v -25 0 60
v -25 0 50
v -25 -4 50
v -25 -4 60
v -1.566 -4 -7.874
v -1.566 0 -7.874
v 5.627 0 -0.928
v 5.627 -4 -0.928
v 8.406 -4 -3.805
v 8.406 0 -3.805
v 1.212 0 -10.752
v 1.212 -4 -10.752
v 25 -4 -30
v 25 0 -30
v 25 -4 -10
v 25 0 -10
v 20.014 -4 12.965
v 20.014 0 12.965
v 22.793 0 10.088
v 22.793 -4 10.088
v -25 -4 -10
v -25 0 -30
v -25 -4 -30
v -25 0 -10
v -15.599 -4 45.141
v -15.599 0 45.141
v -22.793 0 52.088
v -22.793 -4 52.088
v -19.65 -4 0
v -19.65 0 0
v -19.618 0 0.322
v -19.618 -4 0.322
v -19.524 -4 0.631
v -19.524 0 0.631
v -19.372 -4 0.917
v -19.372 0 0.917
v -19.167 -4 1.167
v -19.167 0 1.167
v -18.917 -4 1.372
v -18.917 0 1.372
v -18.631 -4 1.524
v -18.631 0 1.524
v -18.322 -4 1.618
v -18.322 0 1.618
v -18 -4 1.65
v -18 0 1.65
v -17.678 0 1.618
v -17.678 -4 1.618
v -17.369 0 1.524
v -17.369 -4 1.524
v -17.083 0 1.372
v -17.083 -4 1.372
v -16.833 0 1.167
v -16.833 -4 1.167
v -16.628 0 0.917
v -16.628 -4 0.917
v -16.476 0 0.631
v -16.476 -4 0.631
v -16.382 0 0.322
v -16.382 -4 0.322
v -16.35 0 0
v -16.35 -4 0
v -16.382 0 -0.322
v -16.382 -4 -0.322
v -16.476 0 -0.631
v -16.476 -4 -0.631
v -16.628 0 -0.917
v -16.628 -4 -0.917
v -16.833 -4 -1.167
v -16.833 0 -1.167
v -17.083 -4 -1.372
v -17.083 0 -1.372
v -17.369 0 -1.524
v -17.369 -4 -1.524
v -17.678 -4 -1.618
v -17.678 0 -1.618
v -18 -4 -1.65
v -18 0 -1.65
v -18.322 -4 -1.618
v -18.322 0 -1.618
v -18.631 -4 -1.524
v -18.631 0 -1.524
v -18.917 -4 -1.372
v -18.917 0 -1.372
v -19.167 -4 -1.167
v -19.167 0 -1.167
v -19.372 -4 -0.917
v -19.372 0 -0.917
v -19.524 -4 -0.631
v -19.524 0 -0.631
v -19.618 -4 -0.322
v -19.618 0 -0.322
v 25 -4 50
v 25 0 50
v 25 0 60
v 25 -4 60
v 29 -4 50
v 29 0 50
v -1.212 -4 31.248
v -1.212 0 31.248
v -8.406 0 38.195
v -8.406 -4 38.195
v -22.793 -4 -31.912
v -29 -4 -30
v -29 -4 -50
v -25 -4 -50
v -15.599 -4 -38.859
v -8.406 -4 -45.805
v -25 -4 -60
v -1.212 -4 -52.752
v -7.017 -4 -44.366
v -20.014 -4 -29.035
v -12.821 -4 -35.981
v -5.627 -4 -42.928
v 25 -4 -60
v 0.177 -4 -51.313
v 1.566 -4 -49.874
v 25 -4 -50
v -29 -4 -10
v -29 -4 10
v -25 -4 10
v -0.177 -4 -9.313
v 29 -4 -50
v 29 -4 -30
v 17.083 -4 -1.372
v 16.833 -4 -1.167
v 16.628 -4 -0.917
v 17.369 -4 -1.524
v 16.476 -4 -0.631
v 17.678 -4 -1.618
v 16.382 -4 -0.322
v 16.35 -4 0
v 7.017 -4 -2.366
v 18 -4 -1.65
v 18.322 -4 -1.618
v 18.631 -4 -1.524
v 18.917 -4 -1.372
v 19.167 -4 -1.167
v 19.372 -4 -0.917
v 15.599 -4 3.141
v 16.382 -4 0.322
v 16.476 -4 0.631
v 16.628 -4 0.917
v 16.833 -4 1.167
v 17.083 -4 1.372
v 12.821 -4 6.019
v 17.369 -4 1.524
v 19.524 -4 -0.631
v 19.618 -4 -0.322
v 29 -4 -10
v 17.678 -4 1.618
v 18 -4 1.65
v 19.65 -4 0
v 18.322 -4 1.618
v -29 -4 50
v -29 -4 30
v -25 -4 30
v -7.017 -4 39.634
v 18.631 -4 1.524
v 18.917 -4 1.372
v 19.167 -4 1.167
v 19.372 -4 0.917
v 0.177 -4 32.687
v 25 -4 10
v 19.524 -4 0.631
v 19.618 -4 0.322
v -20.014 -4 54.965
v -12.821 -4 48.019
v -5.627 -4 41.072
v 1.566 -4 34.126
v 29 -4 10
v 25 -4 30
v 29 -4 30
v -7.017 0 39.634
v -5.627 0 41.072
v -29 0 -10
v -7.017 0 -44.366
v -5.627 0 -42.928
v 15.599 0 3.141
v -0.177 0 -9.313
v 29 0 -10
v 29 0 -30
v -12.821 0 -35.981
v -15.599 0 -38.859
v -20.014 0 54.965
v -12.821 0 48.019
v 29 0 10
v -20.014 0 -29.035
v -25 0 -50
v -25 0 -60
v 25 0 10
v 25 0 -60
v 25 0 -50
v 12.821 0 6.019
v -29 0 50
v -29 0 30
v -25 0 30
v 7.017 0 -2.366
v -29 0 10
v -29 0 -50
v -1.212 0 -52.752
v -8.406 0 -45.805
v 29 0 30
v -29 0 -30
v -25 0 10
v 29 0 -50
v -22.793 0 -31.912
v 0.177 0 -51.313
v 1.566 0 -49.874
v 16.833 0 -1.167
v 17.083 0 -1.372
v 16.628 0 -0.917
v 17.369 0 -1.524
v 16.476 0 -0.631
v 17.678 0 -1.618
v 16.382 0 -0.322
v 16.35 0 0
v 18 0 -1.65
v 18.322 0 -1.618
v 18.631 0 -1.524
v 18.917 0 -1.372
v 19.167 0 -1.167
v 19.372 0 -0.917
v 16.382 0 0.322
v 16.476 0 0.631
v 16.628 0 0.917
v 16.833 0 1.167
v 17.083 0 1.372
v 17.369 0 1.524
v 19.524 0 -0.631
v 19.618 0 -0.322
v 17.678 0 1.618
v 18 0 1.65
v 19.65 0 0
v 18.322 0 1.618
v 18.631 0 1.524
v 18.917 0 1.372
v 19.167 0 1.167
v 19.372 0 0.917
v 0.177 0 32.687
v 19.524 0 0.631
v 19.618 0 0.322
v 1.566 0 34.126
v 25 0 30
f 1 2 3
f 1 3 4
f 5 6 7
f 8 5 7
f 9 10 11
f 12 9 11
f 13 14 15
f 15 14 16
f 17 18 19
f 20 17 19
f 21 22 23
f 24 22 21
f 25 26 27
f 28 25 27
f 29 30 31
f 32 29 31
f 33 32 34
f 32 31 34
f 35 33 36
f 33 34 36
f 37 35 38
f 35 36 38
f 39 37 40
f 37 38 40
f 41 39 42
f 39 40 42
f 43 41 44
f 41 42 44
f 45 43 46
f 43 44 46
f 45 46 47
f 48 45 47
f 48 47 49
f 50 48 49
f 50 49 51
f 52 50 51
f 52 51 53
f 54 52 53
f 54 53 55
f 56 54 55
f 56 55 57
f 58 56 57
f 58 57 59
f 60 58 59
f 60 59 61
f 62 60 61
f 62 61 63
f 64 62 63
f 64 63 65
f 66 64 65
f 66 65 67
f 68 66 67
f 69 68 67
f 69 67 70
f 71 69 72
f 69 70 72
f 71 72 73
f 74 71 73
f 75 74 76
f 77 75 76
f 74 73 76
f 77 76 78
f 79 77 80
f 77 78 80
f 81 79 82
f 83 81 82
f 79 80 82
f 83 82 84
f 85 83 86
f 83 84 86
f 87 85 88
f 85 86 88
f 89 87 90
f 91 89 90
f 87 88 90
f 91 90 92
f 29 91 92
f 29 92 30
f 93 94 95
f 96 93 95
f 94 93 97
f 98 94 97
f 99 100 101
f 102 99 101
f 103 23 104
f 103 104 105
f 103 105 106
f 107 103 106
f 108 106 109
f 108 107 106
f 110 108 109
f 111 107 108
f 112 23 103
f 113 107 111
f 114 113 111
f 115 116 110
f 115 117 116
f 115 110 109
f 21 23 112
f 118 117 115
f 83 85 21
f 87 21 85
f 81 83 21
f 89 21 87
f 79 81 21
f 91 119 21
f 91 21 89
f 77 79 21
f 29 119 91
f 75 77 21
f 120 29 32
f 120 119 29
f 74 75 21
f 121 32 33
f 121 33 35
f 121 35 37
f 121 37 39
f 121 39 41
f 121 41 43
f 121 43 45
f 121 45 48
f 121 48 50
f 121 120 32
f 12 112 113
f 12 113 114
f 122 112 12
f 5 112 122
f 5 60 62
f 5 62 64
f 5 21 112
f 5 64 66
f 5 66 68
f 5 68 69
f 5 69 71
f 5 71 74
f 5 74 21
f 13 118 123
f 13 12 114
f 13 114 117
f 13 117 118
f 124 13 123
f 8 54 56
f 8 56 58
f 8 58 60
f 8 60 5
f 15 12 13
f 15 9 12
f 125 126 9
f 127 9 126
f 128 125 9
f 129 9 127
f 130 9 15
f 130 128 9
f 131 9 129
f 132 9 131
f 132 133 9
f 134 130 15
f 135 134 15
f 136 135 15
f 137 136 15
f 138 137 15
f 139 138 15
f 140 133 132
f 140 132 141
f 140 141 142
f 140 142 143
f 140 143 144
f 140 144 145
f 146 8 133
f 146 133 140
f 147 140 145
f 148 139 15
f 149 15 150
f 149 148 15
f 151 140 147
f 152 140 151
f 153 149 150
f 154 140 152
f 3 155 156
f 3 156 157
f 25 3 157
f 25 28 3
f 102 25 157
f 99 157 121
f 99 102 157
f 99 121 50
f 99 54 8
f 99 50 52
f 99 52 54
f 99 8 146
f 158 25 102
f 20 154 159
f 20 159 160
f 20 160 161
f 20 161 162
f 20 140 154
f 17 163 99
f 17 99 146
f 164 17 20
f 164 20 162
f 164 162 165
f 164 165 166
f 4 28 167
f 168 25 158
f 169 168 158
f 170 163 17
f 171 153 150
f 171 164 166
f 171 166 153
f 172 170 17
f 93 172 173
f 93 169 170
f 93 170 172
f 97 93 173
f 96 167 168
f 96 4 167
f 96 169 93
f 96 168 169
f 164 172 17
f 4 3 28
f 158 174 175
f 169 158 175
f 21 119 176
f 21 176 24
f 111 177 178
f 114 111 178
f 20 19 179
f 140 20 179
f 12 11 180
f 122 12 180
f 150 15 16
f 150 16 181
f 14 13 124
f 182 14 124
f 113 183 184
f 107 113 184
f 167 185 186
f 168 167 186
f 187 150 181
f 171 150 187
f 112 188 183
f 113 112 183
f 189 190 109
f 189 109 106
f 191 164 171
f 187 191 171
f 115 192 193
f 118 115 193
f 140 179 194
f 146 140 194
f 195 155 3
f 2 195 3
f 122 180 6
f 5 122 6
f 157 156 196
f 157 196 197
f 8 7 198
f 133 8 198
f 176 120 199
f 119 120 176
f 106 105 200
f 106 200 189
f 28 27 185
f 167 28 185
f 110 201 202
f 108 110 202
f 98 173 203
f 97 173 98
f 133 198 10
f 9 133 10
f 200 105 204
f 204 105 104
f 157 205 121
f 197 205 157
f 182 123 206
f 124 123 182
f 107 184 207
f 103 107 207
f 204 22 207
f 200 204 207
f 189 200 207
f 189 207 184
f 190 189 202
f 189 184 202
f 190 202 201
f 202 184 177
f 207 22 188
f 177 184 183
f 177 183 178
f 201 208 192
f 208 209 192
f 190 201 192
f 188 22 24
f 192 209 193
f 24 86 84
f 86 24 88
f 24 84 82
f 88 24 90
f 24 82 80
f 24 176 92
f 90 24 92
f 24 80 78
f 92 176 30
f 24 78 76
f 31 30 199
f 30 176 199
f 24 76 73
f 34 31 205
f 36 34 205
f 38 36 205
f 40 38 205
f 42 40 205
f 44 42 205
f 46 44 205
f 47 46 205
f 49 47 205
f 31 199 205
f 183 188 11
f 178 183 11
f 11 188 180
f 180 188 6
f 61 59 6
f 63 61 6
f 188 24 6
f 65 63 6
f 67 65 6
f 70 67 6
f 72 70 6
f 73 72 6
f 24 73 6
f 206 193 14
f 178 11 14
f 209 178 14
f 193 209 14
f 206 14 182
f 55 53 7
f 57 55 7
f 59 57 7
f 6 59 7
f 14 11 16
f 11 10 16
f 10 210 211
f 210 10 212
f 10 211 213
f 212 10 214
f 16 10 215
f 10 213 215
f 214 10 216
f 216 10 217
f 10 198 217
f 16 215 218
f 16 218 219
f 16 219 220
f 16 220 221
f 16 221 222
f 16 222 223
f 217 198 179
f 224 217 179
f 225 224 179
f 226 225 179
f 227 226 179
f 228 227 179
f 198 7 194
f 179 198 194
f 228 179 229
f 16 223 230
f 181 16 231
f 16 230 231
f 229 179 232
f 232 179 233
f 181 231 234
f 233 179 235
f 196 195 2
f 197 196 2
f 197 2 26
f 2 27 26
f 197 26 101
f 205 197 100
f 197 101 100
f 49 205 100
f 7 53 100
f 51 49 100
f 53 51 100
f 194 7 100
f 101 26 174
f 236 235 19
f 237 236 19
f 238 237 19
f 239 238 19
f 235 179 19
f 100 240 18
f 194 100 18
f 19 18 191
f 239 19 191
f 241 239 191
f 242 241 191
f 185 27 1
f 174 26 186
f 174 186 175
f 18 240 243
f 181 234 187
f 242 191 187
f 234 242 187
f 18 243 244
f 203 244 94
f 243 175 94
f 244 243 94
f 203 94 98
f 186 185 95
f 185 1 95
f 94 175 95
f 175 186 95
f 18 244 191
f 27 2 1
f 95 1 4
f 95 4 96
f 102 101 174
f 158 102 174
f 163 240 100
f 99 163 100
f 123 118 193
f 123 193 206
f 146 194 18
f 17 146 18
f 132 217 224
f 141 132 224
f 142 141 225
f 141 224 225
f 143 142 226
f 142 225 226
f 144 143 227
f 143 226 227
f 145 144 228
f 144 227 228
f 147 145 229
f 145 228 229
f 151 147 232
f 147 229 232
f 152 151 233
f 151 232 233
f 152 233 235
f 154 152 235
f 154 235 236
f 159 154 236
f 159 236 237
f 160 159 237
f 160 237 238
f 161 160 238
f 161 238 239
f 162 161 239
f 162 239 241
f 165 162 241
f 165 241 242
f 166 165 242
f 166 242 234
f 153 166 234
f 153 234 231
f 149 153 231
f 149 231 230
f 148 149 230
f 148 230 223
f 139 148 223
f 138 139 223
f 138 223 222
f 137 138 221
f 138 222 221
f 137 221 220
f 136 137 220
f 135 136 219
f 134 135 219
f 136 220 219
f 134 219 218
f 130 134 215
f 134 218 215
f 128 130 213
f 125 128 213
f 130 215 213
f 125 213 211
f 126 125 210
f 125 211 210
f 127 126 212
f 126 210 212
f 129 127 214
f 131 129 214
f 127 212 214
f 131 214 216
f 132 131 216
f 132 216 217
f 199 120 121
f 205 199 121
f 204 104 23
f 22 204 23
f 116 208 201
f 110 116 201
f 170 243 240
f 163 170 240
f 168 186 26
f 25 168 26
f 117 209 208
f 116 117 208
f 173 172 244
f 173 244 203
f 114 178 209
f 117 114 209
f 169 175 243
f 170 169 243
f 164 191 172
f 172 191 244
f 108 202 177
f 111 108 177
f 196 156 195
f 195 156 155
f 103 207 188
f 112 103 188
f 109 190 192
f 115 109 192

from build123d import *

# Parameters (mm, degrees)
F0_W     = 50
F0_H     = 120
F1_DEPTH = 4
F2_W     = 4
F2_H     = 20
F2_H_2   = 10
F3_DEPTH = 4
F5_D     = 3.3


with BuildPart() as f1:
    # F0 (on Front) → F1 (new body)
    with BuildSketch(Plane.XZ):
        Rectangle(F0_W, F0_H)
        Polygon((-21.4033009983, -30.4732918523), (-20.0139842574, -29.0346122516), (-12.820586254, -35.9811959562), (-14.2099029949, -37.4198755569), (-15.5992197358, -38.8585551576), (-22.7926177392, -31.911971453), align=None, mode=Mode.SUBTRACT)
        Polygon((-1.2124237291, -52.7517225667), (-8.4058217325, -45.8051388622), (-7.0165049915, -44.3664592615), (-5.6271882506, -42.9277796608), (1.5662097528, -49.8743633654), (0.1768930119, -51.3130429661), align=None, mode=Mode.SUBTRACT)
        Polygon((5.6271882506, -0.9277796608), (7.0165049915, -2.3664592615), (8.4058217325, -3.8051388622), (1.2124237291, -10.7517225667), (-0.1768930119, -9.3130429661), (-1.5662097528, -7.8743633654), align=None, mode=Mode.SUBTRACT)
        Polygon((-22.7926177392, 52.088028547), (-21.4033009983, 53.5267081477), (-20.0139842574, 54.9653877484), (-12.820586254, 48.0188040438), (-14.2099029949, 46.5801244431), (-15.5992197358, 45.1414448424), align=None, mode=Mode.SUBTRACT)
        Polygon((-8.4058217325, 38.1948611378), (-7.0165049915, 39.6335407385), (-5.6271882506, 41.0722203392), (1.5662097528, 34.1256366346), (0.1768930119, 32.6869570339), (-1.2124237291, 31.2482774333), align=None, mode=Mode.SUBTRACT)
        Polygon((20.0139842574, 12.9653877484), (21.4033009983, 11.5267081477), (22.7926177392, 10.088028547), (15.5992197358, 3.1414448424), (14.2099029949, 4.5801244431), (12.820586254, 6.0188040438), align=None, mode=Mode.SUBTRACT)
    extrude(amount=F1_DEPTH)

    # F2 (on face) → F3 (join)
    with BuildSketch(Plane.XZ.offset(4)):
        with Locations((-27, 40)):
            Rectangle(F2_W, F2_H)
        with Locations((-27, -5)):
            Rectangle(F2_W, F2_H_2)
        with Locations((-27, 5)):
            Rectangle(F2_W, F2_H_2)
        with Locations((-27, -40)):
            Rectangle(F2_W, F2_H)
        with Locations((27, 5)):
            Rectangle(F2_W, F2_H_2)
        with Locations((27, -5)):
            Rectangle(F2_W, F2_H_2)
        with Locations((27, 40)):
            Rectangle(F2_W, F2_H)
        with Locations((27, -40)):
            Rectangle(F2_W, F2_H)
    extrude(amount=-F3_DEPTH)

    # F5 (through all)
    with Locations(Plane.XZ.offset(4)):
        with Locations((-18, 0), (18, 0)):
            Hole(F5_D / 2)


solid = f1.part
